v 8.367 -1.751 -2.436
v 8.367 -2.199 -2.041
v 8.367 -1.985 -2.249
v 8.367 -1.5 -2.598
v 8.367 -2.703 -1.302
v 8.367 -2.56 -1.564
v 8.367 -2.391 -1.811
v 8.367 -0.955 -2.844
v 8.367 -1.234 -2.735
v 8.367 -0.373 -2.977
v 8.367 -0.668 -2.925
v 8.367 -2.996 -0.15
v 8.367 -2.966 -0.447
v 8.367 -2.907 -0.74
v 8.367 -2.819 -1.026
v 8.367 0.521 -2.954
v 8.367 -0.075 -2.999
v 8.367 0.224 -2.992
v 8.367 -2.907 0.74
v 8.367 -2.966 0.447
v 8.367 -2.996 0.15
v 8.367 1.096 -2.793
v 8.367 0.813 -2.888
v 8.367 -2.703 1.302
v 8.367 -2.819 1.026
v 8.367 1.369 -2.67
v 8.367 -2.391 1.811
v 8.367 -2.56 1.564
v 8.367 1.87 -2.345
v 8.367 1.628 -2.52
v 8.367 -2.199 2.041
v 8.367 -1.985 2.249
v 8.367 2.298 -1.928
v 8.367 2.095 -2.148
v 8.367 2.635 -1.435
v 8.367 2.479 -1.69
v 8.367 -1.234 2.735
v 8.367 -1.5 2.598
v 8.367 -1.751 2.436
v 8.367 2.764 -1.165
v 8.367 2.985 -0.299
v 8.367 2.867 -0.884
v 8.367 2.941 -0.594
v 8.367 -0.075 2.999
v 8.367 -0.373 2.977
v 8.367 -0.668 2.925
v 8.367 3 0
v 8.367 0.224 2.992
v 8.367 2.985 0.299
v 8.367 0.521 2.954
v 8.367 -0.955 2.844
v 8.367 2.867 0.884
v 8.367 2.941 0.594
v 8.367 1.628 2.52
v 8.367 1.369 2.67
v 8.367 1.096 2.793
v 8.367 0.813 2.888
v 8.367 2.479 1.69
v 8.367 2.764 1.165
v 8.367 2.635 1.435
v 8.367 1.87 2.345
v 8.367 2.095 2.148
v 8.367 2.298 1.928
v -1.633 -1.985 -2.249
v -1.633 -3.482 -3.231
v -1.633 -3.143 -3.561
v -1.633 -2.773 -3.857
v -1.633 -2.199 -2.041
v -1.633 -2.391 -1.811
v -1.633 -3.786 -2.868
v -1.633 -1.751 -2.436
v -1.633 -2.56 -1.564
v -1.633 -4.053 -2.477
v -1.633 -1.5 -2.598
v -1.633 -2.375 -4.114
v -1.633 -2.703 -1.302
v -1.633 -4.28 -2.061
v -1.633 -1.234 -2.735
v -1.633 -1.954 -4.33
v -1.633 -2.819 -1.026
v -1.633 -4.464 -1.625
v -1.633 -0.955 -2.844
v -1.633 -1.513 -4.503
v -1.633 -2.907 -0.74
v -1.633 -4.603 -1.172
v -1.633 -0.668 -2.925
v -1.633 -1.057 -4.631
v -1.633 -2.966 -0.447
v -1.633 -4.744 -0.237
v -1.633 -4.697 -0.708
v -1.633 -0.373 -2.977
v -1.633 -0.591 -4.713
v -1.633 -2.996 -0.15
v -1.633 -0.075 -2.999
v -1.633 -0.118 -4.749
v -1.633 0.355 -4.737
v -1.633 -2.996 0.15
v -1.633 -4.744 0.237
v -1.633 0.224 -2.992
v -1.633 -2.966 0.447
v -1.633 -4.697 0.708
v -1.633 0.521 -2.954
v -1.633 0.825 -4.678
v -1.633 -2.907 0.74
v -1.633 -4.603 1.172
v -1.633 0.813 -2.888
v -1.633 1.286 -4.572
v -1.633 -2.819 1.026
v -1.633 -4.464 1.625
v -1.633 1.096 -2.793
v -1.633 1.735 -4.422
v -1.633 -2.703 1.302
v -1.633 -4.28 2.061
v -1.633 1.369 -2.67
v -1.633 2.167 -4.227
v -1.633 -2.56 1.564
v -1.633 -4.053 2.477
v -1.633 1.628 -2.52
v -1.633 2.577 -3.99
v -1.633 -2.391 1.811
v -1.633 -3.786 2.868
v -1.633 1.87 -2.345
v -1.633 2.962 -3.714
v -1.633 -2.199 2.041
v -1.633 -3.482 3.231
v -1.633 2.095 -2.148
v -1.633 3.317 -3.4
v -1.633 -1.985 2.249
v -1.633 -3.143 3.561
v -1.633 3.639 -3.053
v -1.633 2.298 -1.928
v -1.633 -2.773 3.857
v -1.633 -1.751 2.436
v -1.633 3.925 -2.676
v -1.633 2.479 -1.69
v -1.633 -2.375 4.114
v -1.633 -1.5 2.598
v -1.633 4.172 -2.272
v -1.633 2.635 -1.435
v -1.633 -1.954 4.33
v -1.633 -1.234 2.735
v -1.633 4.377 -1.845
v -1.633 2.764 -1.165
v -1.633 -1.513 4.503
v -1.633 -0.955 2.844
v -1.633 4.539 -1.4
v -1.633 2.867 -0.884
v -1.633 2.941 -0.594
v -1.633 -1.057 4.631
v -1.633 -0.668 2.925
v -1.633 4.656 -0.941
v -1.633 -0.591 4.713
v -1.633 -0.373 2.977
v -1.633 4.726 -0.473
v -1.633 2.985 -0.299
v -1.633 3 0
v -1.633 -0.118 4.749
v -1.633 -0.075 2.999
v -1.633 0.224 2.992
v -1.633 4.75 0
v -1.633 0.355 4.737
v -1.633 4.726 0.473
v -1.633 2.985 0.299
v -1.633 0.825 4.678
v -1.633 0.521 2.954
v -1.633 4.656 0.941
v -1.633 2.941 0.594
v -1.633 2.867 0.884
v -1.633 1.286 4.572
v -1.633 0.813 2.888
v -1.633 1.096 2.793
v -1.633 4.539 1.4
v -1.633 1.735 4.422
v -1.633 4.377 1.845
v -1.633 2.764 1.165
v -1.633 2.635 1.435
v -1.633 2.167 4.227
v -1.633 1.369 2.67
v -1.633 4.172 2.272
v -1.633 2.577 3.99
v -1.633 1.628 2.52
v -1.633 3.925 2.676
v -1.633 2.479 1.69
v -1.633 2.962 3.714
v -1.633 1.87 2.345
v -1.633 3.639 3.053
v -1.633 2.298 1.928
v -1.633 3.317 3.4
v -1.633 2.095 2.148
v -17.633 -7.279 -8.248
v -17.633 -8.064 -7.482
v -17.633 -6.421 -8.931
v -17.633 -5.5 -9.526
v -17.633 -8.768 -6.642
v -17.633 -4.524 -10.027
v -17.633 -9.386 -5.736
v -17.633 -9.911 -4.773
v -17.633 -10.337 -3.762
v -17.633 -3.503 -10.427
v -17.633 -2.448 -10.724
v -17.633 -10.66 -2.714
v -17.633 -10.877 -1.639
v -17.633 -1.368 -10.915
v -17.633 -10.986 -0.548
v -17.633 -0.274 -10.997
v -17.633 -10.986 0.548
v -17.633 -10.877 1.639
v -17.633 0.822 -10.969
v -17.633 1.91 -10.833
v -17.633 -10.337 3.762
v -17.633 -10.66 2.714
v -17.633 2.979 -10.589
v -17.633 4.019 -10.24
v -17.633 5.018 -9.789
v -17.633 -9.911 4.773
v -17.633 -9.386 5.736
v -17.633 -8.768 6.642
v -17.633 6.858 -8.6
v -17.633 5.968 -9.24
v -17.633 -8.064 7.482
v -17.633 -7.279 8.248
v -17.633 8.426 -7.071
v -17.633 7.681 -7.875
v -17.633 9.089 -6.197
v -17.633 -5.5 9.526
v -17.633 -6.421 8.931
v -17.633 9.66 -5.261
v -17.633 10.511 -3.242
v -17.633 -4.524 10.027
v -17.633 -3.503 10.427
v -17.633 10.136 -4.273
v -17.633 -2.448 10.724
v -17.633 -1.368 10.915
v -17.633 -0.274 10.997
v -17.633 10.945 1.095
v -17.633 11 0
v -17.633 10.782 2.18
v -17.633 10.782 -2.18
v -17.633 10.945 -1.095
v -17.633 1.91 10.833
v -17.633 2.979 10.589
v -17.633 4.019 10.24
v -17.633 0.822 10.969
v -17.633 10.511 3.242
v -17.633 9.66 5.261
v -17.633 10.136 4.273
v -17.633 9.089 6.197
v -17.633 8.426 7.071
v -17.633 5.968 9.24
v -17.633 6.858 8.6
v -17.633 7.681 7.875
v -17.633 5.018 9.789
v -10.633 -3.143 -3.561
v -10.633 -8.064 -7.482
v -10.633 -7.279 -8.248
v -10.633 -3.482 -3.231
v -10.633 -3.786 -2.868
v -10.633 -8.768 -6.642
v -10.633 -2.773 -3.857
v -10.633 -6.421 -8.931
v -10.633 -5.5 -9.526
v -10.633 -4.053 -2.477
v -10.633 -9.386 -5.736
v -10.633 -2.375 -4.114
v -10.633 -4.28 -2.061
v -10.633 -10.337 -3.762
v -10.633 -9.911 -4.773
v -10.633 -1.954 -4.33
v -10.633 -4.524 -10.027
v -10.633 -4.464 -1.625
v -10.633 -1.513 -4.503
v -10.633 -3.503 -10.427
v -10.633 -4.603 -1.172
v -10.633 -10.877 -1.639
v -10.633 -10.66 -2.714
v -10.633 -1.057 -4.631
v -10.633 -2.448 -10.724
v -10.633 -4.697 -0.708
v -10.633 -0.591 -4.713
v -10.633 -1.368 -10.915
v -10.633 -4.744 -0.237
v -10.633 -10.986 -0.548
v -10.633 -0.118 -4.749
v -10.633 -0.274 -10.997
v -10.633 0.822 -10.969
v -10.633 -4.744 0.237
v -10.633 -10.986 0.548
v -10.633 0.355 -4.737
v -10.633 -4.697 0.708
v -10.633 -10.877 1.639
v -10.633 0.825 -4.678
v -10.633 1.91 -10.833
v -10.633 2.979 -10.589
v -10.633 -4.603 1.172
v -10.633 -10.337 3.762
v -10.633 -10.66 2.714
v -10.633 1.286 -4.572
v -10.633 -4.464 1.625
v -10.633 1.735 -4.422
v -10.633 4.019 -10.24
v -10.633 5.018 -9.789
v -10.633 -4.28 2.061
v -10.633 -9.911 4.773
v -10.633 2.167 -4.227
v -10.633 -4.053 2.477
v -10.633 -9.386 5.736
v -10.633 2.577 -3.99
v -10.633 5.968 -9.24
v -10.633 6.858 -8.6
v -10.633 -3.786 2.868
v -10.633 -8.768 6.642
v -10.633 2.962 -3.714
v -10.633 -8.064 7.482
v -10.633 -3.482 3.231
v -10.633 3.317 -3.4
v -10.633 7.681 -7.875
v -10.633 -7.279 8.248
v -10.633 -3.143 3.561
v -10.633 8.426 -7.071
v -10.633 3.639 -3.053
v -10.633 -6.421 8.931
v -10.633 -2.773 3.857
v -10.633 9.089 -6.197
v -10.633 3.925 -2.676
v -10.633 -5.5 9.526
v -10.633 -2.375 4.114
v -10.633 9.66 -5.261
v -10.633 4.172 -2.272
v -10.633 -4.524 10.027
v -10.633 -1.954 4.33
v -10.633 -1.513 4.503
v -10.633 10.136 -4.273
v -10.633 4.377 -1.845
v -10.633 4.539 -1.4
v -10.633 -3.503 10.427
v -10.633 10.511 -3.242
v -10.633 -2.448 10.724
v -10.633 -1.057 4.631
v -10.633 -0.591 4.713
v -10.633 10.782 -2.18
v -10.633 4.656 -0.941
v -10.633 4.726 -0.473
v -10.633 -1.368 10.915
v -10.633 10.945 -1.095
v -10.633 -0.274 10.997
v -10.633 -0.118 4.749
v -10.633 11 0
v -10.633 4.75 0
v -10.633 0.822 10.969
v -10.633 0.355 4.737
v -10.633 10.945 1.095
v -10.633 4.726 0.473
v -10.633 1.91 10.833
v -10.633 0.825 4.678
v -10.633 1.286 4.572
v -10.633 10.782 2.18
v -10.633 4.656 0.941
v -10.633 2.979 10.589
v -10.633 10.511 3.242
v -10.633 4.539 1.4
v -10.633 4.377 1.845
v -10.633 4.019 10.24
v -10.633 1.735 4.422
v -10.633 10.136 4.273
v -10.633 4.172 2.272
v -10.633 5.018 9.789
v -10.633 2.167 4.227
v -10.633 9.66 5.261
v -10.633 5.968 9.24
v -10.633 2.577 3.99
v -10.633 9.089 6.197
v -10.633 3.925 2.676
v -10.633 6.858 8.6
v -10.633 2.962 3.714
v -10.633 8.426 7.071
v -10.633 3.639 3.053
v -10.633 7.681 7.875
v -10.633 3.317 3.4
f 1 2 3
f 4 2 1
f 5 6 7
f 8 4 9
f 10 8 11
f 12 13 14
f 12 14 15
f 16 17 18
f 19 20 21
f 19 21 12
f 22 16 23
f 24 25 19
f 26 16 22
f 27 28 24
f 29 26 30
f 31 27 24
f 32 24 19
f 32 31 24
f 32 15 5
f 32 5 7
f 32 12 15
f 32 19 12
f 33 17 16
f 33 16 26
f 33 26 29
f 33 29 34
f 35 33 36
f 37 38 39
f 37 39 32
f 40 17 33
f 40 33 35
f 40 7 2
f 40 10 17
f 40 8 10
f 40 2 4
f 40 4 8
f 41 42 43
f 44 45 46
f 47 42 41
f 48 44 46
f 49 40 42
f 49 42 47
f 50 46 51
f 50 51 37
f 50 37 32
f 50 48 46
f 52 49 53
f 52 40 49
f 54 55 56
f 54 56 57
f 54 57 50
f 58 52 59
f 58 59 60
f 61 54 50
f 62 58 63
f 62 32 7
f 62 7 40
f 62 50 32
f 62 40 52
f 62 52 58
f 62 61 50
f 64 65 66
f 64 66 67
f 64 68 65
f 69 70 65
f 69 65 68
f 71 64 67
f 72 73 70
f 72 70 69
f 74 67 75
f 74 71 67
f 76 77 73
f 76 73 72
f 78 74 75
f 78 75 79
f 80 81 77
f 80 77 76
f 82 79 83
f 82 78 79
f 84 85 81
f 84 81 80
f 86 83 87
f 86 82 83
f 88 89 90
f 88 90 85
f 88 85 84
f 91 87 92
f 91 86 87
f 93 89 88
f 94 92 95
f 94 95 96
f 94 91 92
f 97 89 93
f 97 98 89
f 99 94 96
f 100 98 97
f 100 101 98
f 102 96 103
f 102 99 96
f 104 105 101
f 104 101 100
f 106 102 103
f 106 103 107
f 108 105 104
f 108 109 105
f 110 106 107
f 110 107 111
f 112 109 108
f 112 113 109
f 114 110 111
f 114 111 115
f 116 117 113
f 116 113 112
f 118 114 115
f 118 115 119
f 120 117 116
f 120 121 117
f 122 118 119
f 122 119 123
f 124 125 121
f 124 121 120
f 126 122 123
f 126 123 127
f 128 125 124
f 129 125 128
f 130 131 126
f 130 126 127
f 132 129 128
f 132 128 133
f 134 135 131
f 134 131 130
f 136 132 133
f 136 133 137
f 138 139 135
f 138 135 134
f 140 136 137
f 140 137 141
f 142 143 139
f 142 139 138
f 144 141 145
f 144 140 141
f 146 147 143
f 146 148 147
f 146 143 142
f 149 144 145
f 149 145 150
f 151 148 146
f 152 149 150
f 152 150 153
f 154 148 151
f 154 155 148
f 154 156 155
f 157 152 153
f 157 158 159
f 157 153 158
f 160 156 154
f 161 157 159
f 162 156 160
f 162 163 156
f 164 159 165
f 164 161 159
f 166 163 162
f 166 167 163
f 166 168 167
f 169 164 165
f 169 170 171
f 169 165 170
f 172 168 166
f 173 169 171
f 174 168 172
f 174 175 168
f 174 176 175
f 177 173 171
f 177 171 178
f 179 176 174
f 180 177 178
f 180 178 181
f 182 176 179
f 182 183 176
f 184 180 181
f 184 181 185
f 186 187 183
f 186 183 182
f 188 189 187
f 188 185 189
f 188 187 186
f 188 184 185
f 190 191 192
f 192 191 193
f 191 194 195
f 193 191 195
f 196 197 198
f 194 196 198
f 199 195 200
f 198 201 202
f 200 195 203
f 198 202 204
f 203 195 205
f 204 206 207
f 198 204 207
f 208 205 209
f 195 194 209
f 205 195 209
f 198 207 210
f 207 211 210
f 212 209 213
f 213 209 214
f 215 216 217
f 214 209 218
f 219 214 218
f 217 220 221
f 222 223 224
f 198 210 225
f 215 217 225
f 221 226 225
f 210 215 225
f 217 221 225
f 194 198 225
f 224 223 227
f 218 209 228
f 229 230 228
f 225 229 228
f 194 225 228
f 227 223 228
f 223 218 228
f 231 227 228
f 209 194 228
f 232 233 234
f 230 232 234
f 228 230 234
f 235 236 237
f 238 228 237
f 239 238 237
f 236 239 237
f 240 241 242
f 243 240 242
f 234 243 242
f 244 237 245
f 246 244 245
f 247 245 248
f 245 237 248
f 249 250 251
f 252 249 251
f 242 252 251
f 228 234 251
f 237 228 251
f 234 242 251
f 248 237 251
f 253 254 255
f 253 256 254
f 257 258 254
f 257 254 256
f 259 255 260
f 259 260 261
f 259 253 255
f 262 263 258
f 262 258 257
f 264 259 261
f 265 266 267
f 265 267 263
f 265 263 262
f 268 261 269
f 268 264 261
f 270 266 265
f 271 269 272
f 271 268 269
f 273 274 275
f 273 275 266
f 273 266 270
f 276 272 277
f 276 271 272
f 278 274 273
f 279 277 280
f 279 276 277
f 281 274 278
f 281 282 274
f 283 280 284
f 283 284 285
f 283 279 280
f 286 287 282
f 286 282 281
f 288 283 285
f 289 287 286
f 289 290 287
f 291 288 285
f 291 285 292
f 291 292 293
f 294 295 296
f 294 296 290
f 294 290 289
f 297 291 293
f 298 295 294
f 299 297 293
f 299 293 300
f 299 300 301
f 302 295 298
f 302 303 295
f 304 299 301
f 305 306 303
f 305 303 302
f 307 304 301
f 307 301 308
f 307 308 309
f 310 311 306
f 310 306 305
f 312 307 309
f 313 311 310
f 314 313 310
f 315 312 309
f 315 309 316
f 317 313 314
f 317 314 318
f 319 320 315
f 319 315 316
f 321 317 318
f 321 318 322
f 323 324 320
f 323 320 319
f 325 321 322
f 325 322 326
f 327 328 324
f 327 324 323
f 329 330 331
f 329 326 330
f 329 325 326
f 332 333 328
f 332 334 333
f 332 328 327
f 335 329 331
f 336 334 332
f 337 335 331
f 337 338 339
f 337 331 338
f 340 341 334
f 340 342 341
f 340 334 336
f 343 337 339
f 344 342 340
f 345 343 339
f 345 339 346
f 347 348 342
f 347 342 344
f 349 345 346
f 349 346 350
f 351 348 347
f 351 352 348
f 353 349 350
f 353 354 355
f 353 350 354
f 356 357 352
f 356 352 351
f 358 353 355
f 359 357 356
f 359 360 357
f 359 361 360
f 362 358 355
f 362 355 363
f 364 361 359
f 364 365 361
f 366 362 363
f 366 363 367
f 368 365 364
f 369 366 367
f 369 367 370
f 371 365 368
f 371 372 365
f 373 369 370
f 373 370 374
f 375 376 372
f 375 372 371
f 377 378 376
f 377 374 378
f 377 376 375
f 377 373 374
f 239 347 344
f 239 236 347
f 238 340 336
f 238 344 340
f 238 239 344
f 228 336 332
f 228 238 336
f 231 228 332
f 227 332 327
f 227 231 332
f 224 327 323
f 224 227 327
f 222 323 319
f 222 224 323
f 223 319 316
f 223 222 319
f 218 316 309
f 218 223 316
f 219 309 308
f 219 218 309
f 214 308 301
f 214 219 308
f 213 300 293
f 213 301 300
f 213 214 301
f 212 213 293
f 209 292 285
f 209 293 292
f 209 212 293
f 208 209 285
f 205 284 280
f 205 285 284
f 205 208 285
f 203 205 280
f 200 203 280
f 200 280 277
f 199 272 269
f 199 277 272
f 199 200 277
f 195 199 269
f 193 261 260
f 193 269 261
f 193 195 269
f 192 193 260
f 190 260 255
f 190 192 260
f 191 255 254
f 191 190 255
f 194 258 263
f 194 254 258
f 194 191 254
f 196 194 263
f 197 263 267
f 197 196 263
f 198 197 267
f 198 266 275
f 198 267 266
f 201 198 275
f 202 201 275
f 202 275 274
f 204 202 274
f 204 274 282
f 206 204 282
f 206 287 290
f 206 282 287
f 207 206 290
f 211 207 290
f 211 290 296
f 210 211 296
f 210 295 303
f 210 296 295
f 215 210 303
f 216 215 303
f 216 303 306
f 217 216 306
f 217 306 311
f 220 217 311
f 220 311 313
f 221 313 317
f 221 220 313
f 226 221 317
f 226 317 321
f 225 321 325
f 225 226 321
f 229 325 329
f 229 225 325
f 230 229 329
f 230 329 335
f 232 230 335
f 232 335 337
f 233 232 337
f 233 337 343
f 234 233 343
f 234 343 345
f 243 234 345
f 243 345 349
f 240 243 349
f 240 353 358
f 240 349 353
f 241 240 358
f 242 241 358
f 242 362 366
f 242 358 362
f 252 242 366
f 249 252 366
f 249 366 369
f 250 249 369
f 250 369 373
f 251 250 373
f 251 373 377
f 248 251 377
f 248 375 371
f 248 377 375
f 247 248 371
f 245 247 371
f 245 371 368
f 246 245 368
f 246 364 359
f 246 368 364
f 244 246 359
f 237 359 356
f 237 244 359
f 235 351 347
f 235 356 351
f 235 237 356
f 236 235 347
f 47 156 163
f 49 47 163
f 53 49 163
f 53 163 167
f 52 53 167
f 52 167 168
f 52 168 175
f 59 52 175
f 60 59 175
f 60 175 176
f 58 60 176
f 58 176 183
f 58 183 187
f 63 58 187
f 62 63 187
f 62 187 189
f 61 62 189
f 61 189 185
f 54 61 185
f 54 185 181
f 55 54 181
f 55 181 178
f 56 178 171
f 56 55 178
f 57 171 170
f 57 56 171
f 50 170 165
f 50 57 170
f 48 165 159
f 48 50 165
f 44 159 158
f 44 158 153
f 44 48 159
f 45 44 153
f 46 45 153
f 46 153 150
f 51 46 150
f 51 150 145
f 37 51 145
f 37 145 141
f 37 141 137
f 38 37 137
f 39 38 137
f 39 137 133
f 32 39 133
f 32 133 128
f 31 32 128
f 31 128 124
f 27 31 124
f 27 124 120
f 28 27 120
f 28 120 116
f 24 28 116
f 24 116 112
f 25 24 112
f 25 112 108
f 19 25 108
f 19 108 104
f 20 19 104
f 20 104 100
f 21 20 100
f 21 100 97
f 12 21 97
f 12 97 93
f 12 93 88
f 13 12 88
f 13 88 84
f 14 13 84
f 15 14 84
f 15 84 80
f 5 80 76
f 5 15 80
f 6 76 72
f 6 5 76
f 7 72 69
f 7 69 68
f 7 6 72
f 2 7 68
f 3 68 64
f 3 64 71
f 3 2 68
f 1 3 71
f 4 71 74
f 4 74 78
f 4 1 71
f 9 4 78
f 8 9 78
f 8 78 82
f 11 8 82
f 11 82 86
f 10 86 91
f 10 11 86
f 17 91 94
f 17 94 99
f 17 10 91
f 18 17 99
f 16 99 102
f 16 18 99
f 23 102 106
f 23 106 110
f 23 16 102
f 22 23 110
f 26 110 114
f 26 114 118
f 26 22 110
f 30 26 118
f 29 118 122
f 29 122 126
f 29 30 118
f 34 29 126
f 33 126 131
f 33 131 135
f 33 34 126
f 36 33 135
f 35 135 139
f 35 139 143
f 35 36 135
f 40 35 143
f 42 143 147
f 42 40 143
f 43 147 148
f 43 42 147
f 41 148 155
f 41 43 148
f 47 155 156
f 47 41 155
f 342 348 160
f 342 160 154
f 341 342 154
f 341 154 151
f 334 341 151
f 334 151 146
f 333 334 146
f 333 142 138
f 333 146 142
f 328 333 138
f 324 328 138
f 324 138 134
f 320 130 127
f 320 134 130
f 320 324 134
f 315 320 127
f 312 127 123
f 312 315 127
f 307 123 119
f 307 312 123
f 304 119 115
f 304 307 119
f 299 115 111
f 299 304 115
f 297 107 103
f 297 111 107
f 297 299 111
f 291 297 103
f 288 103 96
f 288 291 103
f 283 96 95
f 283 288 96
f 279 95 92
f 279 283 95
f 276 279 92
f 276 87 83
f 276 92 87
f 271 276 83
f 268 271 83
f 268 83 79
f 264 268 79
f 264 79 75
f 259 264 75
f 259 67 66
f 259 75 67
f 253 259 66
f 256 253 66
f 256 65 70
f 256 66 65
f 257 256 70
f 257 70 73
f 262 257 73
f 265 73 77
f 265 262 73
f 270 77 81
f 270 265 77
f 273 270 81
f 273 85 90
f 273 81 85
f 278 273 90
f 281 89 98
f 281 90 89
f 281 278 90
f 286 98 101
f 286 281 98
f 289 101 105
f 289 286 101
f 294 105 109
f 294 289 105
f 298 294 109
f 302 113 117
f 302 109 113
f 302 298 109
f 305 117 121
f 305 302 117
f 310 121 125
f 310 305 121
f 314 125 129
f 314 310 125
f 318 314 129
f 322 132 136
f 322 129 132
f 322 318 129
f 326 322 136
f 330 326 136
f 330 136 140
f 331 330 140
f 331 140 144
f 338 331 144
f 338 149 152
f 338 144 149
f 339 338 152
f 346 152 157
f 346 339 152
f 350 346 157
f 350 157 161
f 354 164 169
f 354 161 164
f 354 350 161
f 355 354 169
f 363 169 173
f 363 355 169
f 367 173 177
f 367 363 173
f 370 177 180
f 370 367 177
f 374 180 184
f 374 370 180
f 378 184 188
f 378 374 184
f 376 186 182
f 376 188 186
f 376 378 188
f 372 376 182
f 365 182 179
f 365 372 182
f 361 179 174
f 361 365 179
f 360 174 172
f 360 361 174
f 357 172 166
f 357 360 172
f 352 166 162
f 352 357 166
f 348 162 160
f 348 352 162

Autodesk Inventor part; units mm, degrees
ref_plane "YZ Plane" through (0, 0, 0) normal (1, 0, 0) x (0, 1, 0)
ref_plane "XZ Plane" through (0, 0, 0) normal (0, 1, 0) x (-1, 0, 0)
ref_plane "XY Plane" through (0, 0, 0) normal (0, 0, 1) x (1, 0, 0)
sketch "Sketch1" plane through (0, 0, 0) normal (0, 0, 1) x (1, 0, 0)
  line L0 (-1.633, 4.75) -> (-10.633, 4.75)
  line L1 (-10.633, 4.75) -> (-10.633, 11)
  line L2 (-10.633, 11) -> (-17.633, 11)
  line L3 (-17.633, 11) -> (-17.633, 0)
  line L4 (-17.633, 0) -> (8.367, 0)
  line L5 (-1.633, 4.75) -> (-1.633, 3)
  line L6 (-1.633, 3) -> (8.367, 3)
  line L7 (8.367, 3) -> (8.367, 0)
  point P0 (0, 0)
  dimension "d3" = 9
  dimension "d5" = 11
  dimension "d6" = 7
  dimension "d7" = 1.75
  dimension "d8" = 3
  dimension "d9" = 4.75
revolve "Revolution1" add sketch "Sketch1" angle 360 about axis through (-17.633, 0, 0) along (1, 0, 0)
properties part number "guia"
